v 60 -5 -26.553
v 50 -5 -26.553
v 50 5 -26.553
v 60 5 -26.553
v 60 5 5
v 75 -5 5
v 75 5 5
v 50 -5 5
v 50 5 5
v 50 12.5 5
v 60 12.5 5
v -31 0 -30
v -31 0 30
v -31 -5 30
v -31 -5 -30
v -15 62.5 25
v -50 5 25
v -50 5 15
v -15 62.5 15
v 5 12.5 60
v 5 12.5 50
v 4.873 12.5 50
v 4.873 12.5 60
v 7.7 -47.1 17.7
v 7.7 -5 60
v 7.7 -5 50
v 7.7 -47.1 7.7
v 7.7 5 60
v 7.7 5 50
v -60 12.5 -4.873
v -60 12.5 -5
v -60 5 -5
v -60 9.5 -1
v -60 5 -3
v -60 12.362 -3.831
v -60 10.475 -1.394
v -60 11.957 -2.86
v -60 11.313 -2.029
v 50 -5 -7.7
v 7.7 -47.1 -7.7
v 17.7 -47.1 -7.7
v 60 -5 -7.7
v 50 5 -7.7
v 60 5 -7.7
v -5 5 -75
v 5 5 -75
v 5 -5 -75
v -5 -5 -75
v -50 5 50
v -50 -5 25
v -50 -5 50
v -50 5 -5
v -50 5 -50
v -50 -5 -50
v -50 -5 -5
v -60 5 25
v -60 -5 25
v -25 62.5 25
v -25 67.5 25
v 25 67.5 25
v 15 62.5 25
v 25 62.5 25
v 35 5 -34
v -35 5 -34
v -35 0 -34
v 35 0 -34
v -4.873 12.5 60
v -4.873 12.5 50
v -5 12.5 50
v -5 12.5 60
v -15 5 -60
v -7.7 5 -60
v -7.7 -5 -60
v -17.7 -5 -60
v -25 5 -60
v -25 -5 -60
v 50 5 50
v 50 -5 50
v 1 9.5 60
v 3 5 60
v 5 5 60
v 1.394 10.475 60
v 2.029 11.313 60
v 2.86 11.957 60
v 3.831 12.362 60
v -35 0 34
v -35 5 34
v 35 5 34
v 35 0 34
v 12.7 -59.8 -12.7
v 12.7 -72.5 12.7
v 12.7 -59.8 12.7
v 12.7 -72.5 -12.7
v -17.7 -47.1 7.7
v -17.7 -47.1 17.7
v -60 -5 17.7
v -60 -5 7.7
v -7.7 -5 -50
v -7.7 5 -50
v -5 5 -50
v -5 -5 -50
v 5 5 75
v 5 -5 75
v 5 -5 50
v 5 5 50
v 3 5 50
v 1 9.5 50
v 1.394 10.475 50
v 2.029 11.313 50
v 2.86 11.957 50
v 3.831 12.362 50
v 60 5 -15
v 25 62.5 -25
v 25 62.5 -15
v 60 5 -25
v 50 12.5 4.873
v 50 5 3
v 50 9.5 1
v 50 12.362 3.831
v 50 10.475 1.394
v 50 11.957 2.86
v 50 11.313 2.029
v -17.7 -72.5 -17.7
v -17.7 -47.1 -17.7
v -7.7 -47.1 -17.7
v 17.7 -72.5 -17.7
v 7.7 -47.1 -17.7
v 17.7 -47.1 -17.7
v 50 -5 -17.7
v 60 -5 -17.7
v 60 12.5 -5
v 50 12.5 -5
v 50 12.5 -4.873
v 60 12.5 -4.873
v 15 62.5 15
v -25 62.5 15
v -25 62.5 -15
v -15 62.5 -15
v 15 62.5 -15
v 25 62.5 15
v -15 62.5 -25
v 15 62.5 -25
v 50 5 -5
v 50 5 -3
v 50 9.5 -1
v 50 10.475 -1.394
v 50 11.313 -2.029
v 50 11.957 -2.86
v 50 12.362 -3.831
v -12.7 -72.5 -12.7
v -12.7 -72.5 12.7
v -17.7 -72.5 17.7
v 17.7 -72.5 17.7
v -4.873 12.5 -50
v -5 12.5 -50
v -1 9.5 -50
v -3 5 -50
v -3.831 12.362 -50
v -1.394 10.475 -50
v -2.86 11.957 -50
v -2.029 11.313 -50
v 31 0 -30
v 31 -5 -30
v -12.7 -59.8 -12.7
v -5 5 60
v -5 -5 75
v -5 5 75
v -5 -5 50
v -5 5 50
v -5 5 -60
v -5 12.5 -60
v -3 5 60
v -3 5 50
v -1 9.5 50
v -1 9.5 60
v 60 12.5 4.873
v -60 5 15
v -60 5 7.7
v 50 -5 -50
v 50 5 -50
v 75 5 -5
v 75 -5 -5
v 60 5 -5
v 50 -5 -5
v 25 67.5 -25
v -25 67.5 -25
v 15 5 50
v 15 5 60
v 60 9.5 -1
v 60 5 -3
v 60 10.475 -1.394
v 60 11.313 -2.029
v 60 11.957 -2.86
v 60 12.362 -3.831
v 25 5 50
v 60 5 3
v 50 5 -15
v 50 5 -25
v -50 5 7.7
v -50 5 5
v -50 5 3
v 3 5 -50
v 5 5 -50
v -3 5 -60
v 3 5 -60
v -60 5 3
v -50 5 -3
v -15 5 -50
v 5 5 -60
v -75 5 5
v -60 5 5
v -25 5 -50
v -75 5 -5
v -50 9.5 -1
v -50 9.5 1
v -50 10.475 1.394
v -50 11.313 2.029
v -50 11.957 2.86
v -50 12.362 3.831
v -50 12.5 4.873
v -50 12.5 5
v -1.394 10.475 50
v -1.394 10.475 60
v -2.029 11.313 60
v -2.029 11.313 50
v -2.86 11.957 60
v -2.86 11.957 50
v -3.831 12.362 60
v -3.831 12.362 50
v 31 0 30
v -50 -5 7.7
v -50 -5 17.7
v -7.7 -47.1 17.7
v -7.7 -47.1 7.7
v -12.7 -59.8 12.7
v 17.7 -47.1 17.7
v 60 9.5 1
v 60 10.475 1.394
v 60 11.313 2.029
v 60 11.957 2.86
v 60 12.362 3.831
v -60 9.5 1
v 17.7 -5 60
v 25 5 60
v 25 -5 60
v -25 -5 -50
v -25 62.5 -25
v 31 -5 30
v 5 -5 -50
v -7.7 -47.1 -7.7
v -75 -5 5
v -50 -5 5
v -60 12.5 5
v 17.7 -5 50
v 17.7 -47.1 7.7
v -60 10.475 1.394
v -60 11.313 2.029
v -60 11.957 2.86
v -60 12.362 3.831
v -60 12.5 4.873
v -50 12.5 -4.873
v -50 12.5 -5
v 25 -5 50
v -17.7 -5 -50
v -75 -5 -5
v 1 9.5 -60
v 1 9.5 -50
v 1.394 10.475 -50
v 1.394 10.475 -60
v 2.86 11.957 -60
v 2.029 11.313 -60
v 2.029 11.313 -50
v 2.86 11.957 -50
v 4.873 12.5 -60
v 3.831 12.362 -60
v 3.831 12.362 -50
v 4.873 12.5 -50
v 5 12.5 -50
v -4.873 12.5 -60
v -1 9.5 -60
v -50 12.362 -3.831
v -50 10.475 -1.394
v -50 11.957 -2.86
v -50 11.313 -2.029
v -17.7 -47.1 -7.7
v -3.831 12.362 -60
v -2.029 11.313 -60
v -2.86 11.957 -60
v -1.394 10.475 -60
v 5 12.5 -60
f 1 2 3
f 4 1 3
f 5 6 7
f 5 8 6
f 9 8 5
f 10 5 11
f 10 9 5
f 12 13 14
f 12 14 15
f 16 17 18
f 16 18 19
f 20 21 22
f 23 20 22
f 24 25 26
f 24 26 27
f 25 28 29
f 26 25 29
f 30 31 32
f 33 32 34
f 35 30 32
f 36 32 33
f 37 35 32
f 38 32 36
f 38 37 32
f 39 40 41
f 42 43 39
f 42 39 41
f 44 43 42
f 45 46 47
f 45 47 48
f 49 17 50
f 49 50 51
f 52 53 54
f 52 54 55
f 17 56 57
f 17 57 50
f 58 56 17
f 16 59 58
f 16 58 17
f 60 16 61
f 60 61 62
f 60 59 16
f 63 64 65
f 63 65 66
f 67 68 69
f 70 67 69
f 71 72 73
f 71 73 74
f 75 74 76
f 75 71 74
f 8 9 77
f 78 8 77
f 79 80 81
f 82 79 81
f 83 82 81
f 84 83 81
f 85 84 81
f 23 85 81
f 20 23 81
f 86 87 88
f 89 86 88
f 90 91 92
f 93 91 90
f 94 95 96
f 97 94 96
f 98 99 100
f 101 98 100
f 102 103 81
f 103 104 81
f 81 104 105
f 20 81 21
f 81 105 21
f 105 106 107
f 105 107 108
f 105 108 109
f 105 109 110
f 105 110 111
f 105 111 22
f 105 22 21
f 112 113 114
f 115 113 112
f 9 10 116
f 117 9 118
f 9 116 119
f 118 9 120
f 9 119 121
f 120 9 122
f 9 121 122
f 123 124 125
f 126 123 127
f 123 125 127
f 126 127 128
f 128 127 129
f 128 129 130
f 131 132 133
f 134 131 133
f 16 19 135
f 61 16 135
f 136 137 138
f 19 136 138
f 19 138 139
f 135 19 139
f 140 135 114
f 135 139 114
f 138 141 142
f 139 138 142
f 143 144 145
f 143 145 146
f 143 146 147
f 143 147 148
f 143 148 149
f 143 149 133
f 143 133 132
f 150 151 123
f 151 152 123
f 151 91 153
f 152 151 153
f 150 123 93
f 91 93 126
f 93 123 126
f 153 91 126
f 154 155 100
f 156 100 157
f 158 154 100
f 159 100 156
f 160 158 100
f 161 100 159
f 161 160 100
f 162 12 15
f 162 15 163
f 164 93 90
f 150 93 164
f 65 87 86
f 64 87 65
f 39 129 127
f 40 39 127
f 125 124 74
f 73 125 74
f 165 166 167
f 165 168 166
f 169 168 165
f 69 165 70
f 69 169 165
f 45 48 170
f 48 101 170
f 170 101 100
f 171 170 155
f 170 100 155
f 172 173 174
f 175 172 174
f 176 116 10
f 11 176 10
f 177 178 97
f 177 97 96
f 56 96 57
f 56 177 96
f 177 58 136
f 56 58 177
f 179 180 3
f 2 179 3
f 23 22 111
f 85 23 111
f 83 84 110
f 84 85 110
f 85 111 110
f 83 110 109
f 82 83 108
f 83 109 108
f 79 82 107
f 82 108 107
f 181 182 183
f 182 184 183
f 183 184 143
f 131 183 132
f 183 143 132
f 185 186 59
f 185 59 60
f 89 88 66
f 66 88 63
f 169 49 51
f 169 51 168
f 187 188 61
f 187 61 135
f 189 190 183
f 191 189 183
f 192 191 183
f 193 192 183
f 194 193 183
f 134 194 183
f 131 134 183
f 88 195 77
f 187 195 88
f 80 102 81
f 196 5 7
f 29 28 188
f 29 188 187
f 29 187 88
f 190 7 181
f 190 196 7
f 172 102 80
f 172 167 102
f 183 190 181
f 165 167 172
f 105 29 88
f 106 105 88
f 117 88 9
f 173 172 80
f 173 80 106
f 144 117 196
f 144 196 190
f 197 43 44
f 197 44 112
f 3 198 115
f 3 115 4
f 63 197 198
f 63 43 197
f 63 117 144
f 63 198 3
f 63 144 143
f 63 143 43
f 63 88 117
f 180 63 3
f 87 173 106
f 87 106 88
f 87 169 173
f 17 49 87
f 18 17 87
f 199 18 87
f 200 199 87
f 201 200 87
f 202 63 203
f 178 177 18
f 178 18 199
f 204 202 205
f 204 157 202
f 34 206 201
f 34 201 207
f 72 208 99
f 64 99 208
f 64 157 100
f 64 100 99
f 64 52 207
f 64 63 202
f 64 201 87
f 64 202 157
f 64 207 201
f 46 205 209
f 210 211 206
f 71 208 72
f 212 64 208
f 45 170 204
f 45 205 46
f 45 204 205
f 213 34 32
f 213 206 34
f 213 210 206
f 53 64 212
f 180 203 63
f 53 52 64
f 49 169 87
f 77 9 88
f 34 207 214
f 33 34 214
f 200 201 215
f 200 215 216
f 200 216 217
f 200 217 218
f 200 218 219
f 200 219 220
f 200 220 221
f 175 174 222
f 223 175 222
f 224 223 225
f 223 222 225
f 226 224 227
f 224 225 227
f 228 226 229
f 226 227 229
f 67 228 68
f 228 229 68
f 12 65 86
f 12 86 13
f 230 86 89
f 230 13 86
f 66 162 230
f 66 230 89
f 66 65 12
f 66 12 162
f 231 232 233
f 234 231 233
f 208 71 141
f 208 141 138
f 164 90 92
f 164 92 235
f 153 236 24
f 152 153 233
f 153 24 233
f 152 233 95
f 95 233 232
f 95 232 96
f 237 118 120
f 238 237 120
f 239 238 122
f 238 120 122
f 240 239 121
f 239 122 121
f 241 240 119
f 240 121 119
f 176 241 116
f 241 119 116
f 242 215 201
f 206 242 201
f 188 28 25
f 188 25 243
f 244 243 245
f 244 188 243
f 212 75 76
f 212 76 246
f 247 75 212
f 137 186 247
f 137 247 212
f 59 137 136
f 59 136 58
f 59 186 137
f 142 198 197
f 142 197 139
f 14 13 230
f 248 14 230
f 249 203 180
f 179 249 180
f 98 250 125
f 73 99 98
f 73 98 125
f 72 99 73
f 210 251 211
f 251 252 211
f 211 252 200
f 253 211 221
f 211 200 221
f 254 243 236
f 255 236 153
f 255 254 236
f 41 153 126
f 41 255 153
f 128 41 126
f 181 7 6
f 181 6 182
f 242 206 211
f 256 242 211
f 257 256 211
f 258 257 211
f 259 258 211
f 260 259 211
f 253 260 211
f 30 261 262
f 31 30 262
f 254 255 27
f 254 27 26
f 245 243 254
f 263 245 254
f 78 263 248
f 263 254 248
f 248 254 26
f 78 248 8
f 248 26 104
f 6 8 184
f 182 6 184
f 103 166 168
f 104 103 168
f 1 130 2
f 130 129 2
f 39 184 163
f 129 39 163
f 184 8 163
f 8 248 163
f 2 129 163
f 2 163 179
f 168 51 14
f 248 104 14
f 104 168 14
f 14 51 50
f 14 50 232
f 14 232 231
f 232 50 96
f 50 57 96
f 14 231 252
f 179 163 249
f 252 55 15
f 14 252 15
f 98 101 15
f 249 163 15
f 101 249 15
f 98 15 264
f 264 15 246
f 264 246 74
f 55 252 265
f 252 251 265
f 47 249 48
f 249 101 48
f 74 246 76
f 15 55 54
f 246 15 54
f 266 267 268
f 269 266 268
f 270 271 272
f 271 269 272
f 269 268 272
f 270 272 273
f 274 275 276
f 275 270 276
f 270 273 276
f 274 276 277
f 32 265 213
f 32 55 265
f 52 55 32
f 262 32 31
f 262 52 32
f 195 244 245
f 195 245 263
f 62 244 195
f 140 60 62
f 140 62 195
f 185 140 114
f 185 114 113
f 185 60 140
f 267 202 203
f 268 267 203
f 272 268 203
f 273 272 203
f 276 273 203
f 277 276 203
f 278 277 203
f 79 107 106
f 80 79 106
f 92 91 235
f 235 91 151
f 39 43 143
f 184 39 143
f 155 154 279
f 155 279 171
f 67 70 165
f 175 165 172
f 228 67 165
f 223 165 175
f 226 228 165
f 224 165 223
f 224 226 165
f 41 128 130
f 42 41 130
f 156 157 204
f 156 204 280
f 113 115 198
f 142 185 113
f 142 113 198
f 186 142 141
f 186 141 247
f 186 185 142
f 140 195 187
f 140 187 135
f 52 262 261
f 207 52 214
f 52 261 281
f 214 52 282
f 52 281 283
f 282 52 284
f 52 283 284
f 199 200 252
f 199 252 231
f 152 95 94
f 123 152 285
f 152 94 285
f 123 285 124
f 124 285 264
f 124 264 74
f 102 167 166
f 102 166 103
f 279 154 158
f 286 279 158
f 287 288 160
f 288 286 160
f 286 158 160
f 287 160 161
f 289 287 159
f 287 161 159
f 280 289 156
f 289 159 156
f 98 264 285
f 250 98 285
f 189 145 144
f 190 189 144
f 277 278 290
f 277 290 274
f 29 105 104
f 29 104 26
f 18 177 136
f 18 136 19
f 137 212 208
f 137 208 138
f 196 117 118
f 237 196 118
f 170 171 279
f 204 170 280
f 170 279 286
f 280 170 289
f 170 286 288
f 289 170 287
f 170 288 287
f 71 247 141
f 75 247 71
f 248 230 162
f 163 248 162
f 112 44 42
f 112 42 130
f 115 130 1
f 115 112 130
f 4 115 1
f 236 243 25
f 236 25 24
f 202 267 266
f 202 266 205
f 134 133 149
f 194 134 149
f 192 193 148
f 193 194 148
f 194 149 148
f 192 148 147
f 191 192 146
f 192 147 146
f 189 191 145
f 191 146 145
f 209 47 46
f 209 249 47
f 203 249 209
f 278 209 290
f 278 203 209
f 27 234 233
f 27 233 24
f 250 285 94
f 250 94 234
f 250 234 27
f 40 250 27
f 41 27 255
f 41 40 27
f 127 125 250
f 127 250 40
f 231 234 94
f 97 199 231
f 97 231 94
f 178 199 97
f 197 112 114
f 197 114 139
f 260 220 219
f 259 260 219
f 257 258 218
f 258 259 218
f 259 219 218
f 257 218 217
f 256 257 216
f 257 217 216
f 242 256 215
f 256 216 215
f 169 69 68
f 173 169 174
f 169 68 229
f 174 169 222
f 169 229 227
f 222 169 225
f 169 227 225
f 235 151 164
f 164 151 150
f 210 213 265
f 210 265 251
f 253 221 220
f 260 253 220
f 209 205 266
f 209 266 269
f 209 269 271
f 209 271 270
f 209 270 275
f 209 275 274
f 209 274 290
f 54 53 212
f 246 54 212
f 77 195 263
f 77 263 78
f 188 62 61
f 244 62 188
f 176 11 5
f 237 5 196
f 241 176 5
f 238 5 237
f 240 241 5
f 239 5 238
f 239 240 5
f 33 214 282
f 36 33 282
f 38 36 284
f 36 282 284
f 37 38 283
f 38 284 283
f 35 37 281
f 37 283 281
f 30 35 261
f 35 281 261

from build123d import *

# Parameters (mm, degrees)
SKETCH2_W            = 100
SKETCH2_H            = 100
BOSS_EXTRUDE1_DEPTH  = 5
SKETCH3_W            = 100
SKETCH3_H            = 100
BOSS_EXTRUDE2_DEPTH  = 5
SKETCH8_R            = 5
BOSS_EXTRUDE7_DEPTH  = 30
BOSS_EXTRUDE21_DEPTH = 10
FILLET14_R           = 4
FILLET13_R           = 4
SKETCH24_W           = 10
SKETCH24_H           = 10
BOSS_EXTRUDE22_DEPTH = 15
BOSS_EXTRUDE25_DEPTH = 10
SKETCH26_W           = 10
SKETCH26_H           = 10
BOSS_EXTRUDE26_DEPTH = 15
FILLET18_R           = 4
FILLET17_R           = 4
BOSS_EXTRUDE23_DEPTH = 10
SKETCH25_W           = 10
SKETCH25_H           = 10
BOSS_EXTRUDE24_DEPTH = 15
FILLET15_R           = 4
FILLET16_R           = 4
BOSS_EXTRUDE10_DEPTH = 10
FILLET19_R           = 4
SKETCH27_W           = 10
SKETCH27_H           = 10
BOSS_EXTRUDE27_DEPTH = 15
FILLET20_R           = 4
SKETCH62_R           = 11.223510807
CUT_EXTRUDE3_DEPTH   = 30
SKETCH64_W           = 35.4
SKETCH64_H           = 35.4
BOSS_EXTRUDE53_DEPTH = 25.4
SKETCH66_W           = 25.4
SKETCH66_H           = 25.4
CUT_EXTRUDE4_DEPTH   = 12.7
SKETCH67_W           = 50
SKETCH67_H           = 50
BOSS_EXTRUDE54_DEPTH = 5
SKETCH68_W           = 17.3
SKETCH68_H           = 10
BOSS_EXTRUDE55_DEPTH = 10
SKETCH69_W           = 17.3
SKETCH69_H           = 10
BOSS_EXTRUDE56_DEPTH = 10
SKETCH70_W           = 17.3
SKETCH70_H           = 10
BOSS_EXTRUDE57_DEPTH = 10
SKETCH74_W           = 17.3
SKETCH74_H           = 10
BOSS_EXTRUDE58_DEPTH = 10
BOSS_EXTRUDE59_DEPTH = 10
BOSS_EXTRUDE60_DEPTH = 10
BOSS_EXTRUDE61_DEPTH = 10
BOSS_EXTRUDE62_DEPTH = 10
BOSS_EXTRUDE63_DEPTH = 10
BOSS_EXTRUDE64_DEPTH = 10
SKETCH85_W           = 17.3
SKETCH85_H           = 10
BOSS_EXTRUDE65_DEPTH = 10
BOSS_EXTRUDE66_DEPTH = 10
BOSS_EXTRUDE67_DEPTH = 10
SKETCH90_W           = 70
SKETCH90_H           = 68
CUT_EXTRUDE5_DEPTH   = 5
SKETCH91_W           = 62
SKETCH91_H           = 60
CUT_EXTRUDE6_DEPTH   = 5


with BuildPart() as part:
    # Sketch2 → Boss-Extrude1 (new body)
    with BuildSketch(Plane(origin=(0, 0, 0), x_dir=(1, 0, 0), z_dir=(0, 1, 0))):
        Rectangle(SKETCH2_W, SKETCH2_H)
    extrude(amount=BOSS_EXTRUDE1_DEPTH)

    # Sketch3 → Boss-Extrude2 (add)
    with BuildSketch(Plane.XZ):
        Rectangle(SKETCH3_W, SKETCH3_H)
    extrude(amount=BOSS_EXTRUDE2_DEPTH)

    # Sketch8 → Boss-Extrude7 (add)
    with BuildSketch(Plane.XZ.offset(5)):
        with Locations(Location((0, 0, 0), (0, 0, 90))):
            Circle(SKETCH8_R)
    extrude(amount=BOSS_EXTRUDE7_DEPTH)

    # Sketch11 → Boss-Extrude21 (add)
    with BuildSketch(Plane(origin=(50, 0, 0), x_dir=(0, 0, -1), z_dir=(1, 0, 0))):
        Polygon((5, -5), (5, 12.5), (1, 12.5), (1, 9.5), (3, 5), (-3, 5), (-1, 9.5), (-1, 12.5), (-5, 12.5), (-5, -5), align=None)
    extrude(amount=BOSS_EXTRUDE21_DEPTH)

    # Fillet14
    # the kernel refuses this fillet: 4 mm, written as the material it takes off along each edge
    with BuildSketch(Plane(origin=(40.317541634, 12.5, -1), x_dir=(0, -1, 0), z_dir=(1, 0, 0))) as fillet14_piece_1:
        with BuildLine():
            CenterArc((4, 3.872983346), FILLET14_R, 180, 75.522487814)
            Line((0, 3.872983346), (-0.08, 3.872983346))
            Line((-0.08, 3.872983346), (-0.08, 0))
            Line((-0.08, 0), (0, -0.08))
            ThreePointArc((0, -0.08), (1.5, -0.08), (2.98, -0.077459667))
            Line((2.98, -0.077459667), (3, 0))
        make_face()
    extrude(amount=29.364916731, mode=Mode.SUBTRACT)

    # Fillet13
    # the kernel refuses this fillet: 4 mm, written as the material it takes off along each edge
    with BuildSketch(Plane(origin=(40.317541634, 12.5, 1), x_dir=(0, 0, 1), z_dir=(1, 0, 0))) as fillet13_piece_1:
        with BuildLine():
            CenterArc((3.872983346, 4), FILLET13_R, 194.477512186, 75.522487814)
            Line((0, 3), (-0.077459667, 2.98))
            ThreePointArc((-0.077459667, 2.98), (-0.08, 1.5), (-0.08, 0))
            Line((-0.08, 0), (0, -0.08))
            Line((0, -0.08), (3.872983346, -0.08))
            Line((3.872983346, -0.08), (3.872983346, 0))
        make_face()
    extrude(amount=29.364916731, mode=Mode.SUBTRACT)

    # Sketch24 → Boss-Extrude22 (add)
    with BuildSketch(Plane(origin=(60, 0, 0), x_dir=(0, 0, -1), z_dir=(1, 0, 0))):
        Rectangle(SKETCH24_W, SKETCH24_H)
    extrude(amount=BOSS_EXTRUDE22_DEPTH)

    # Sketch13 → Boss-Extrude25 (add)
    with BuildSketch(Plane.ZY.offset(50)):
        Polygon((-5, 12.5), (-5, -5), (5, -5), (5, 12.5), (1, 12.5), (1, 9.5), (3, 5), (-3, 5), (-1, 9.5), (-1, 12.5), align=None)
    extrude(amount=BOSS_EXTRUDE25_DEPTH)

    # Sketch26 → Boss-Extrude26 (add)
    with BuildSketch(Plane.ZY.offset(60)):
        Rectangle(SKETCH26_W, SKETCH26_H)
    extrude(amount=BOSS_EXTRUDE26_DEPTH)

    # Fillet18
    # the kernel refuses this fillet: 4 mm, written as the material it takes off along each edge
    with BuildSketch(Plane(origin=(-40.317541634, 12.5, 1), x_dir=(0, -1, 0), z_dir=(-1, 0, 0))) as fillet18_piece_1:
        with BuildLine():
            CenterArc((4, 3.872983346), FILLET18_R, 180, 75.522487814)
            Line((0, 3.872983346), (-0.08, 3.872983346))
            Line((-0.08, 3.872983346), (-0.08, 0))
            Line((-0.08, 0), (0, -0.08))
            ThreePointArc((0, -0.08), (1.5, -0.08), (2.98, -0.077459667))
            Line((2.98, -0.077459667), (3, 0))
        make_face()
    extrude(amount=29.364916731, mode=Mode.SUBTRACT)

    # Fillet17
    # the kernel refuses this fillet: 4 mm, written as the material it takes off along each edge
    with BuildSketch(Plane(origin=(-40.317541634, 12.5, -1), x_dir=(0, 0, -1), z_dir=(-1, 0, 0))) as fillet17_piece_1:
        with BuildLine():
            CenterArc((3.872983346, 4), FILLET17_R, 194.477512186, 75.522487814)
            Line((0, 3), (-0.077459667, 2.98))
            ThreePointArc((-0.077459667, 2.98), (-0.08, 1.5), (-0.08, 0))
            Line((-0.08, 0), (0, -0.08))
            Line((0, -0.08), (3.872983346, -0.08))
            Line((3.872983346, -0.08), (3.872983346, 0))
        make_face()
    extrude(amount=29.364916731, mode=Mode.SUBTRACT)

    # Sketch14 → Boss-Extrude23 (add)
    with BuildSketch(Plane(origin=(0, 0, -50), x_dir=(-1, 0, 0), z_dir=(0, 0, -1))):
        Polygon((-5, 12.5), (-1, 12.5), (-1, 9.5), (-3, 5), (3, 5), (1, 9.5), (1, 12.5), (5, 12.5), (5, -5), (-5, -5), align=None)
    extrude(amount=BOSS_EXTRUDE23_DEPTH)

    # Sketch25 → Boss-Extrude24 (add)
    with BuildSketch(Plane(origin=(0, 0, -60), x_dir=(-1, 0, 0), z_dir=(0, 0, -1))):
        Rectangle(SKETCH25_W, SKETCH25_H)
    extrude(amount=BOSS_EXTRUDE24_DEPTH)

    # Fillet15
    # the kernel refuses this fillet: 4 mm, written as the material it takes off along each edge
    with BuildSketch(Plane(origin=(-1, 12.5, -40.317541634), x_dir=(0, -1, 0), z_dir=(0, 0, -1))) as fillet15_piece_1:
        with BuildLine():
            CenterArc((4, 3.872983346), FILLET15_R, 180, 75.522487814)
            Line((0, 3.872983346), (-0.08, 3.872983346))
            Line((-0.08, 3.872983346), (-0.08, 0))
            Line((-0.08, 0), (0, -0.08))
            ThreePointArc((0, -0.08), (1.5, -0.08), (2.98, -0.077459667))
            Line((2.98, -0.077459667), (3, 0))
        make_face()
    extrude(amount=29.364916731, mode=Mode.SUBTRACT)

    # Fillet16
    # the kernel refuses this fillet: 4 mm, written as the material it takes off along each edge
    with BuildSketch(Plane(origin=(1, 12.5, -40.317541634), x_dir=(0, -1, 0), z_dir=(0, 0, -1))) as fillet16_piece_1:
        with BuildLine():
            CenterArc((4, -3.872983346), FILLET16_R, 104.477512186, 75.522487814)
            Line((0, -3.872983346), (-0.08, -3.872983346))
            Line((-0.08, -3.872983346), (-0.08, 0))
            Line((-0.08, 0), (0, 0.08))
            ThreePointArc((0, 0.08), (1.5, 0.08), (2.98, 0.077459667))
            Line((2.98, 0.077459667), (3, 0))
        make_face()
    extrude(amount=29.364916731, mode=Mode.SUBTRACT)

    # Sketch12 → Boss-Extrude10 (add)
    with BuildSketch(Plane.XY.offset(50)):
        Polygon((-5, 12.5), (-5, -5), (5, -5), (5, 12.5), (1, 12.5), (1, 9.5), (3, 5), (-3, 5), (-1, 9.5), (-1, 12.5), align=None)
    extrude(amount=BOSS_EXTRUDE10_DEPTH)

    # Fillet19
    # the kernel refuses this fillet: 4 mm, written as the material it takes off along each edge
    with BuildSketch(Plane(origin=(-1, 12.5, 40.317541634), x_dir=(-1, 0, 0), z_dir=(0, 0, 1))) as fillet19_piece_1:
        with BuildLine():
            CenterArc((3.872983346, 4), FILLET19_R, 194.477512186, 75.522487814)
            Line((0, 3), (-0.077459667, 2.98))
            ThreePointArc((-0.077459667, 2.98), (-0.08, 1.5), (-0.08, 0))
            Line((-0.08, 0), (0, -0.08))
            Line((0, -0.08), (3.872983346, -0.08))
            Line((3.872983346, -0.08), (3.872983346, 0))
        make_face()
    extrude(amount=29.364916731, mode=Mode.SUBTRACT)

    # Sketch27 → Boss-Extrude27 (add)
    with BuildSketch(Plane.XY.offset(60)):
        Rectangle(SKETCH27_W, SKETCH27_H)
    extrude(amount=BOSS_EXTRUDE27_DEPTH)

    # Fillet20
    # the kernel refuses this fillet: 4 mm, written as the material it takes off along each edge
    with BuildSketch(Plane(origin=(1, 12.5, 40.317541634), x_dir=(1, 0, 0), z_dir=(0, 0, 1))) as fillet20_piece_1:
        with BuildLine():
            CenterArc((3.872983346, -4), FILLET20_R, 90, 75.522487814)
            Line((0, -3), (-0.077459667, -2.98))
            ThreePointArc((-0.077459667, -2.98), (-0.08, -1.5), (-0.08, 0))
            Line((-0.08, 0), (0, 0.08))
            Line((0, 0.08), (3.872983346, 0.08))
            Line((3.872983346, 0.08), (3.872983346, 0))
        make_face()
    extrude(amount=29.364916731, mode=Mode.SUBTRACT)

    # Sketch62 → Cut-Extrude3 (cut)
    with BuildSketch(Plane.XZ.offset(5)):
        Circle(SKETCH62_R)
    extrude(amount=CUT_EXTRUDE3_DEPTH, mode=Mode.SUBTRACT)

    # Sketch68 → Boss-Extrude55 (add)
    with BuildSketch(Plane.XY.offset(50)):
        with Locations((16.35, 0)):
            Rectangle(SKETCH68_W, SKETCH68_H)
    extrude(amount=BOSS_EXTRUDE55_DEPTH)

    # Sketch69 → Boss-Extrude56 (add)
    with BuildSketch(Plane(origin=(50, 0, 0), x_dir=(0, 0, -1), z_dir=(1, 0, 0))):
        with Locations((17.90253263, 0)):
            Rectangle(SKETCH69_W, SKETCH69_H)
    extrude(amount=BOSS_EXTRUDE56_DEPTH)

    # Sketch70 → Boss-Extrude57 (add)
    with BuildSketch(Plane(origin=(0, 0, -50), x_dir=(-1, 0, 0), z_dir=(0, 0, -1))):
        with Locations((16.35, 0)):
            Rectangle(SKETCH70_W, SKETCH70_H)
    extrude(amount=BOSS_EXTRUDE57_DEPTH)

    # Sketch74 → Boss-Extrude58 (add)
    with BuildSketch(Plane.ZY.offset(50)):
        with Locations((16.35, 0)):
            Rectangle(SKETCH74_W, SKETCH74_H)
    extrude(amount=BOSS_EXTRUDE58_DEPTH)



with BuildPart() as body_2:
    # Sketch64 → Boss-Extrude53 (new body)
    with BuildSketch(Plane(origin=(0, -72.5, 0), x_dir=(1, 0, 0), z_dir=(0, 1, 0))):
        Rectangle(SKETCH64_W, SKETCH64_H)
    extrude(amount=BOSS_EXTRUDE53_DEPTH)

    # Sketch66 → Cut-Extrude4 (cut)
    with BuildSketch(Plane(origin=(0, -72.5, 0), x_dir=(-1, 0, 0), z_dir=(0, -1, 0))):
        Rectangle(SKETCH66_W, SKETCH66_H)
    extrude(amount=-CUT_EXTRUDE4_DEPTH, mode=Mode.SUBTRACT)


with BuildPart() as body_3:
    # Sketch67 → Boss-Extrude54 (new body)
    with BuildSketch(Plane(origin=(0, 67.5, 0), x_dir=(1, 0, 0), z_dir=(0, 1, 0))):
        Rectangle(SKETCH67_W, SKETCH67_H)
    extrude(amount=-BOSS_EXTRUDE54_DEPTH)


with BuildPart() as part_1:
    add(part.part)

    add(body_2.part)  # Boss-Extrude59 merges body 2
    # Sketch76 → Boss-Extrude59 (add)
    with BuildSketch(Plane.ZY.offset(17.7)):
        Polygon((-17.7, -47.1), (-60, -5), (-50, -5), (-7.7, -47.1), align=None)
    extrude(amount=-BOSS_EXTRUDE59_DEPTH)


    add(body_3.part)  # Boss-Extrude60 merges body 3
    # Sketch77 → Boss-Extrude60 (add)
    with BuildSketch(Plane.ZY.offset(25)):
        Polygon((-25, 62.5), (-60, 5), (-50, 5), (-15, 62.5), align=None)
    extrude(amount=-BOSS_EXTRUDE60_DEPTH)

    # Sketch78 → Boss-Extrude61 (add)
    with BuildSketch(Plane.XY.offset(17.7)):
        Polygon((-17.7, -47.1), (-60, -5), (-50, -5), (-7.7, -47.1), align=None)
    extrude(amount=-BOSS_EXTRUDE61_DEPTH)

    # Sketch79 → Boss-Extrude62 (add)
    with BuildSketch(Plane.XY.offset(25)):
        Polygon((-25, 62.5), (-60, 5), (-50, 5), (-15, 62.5), align=None)
    extrude(amount=-BOSS_EXTRUDE62_DEPTH)

    # Sketch82 → Boss-Extrude63 (add)
    with BuildSketch(Plane(origin=(17.7, 0, 0), x_dir=(0, 0, -1), z_dir=(1, 0, 0))):
        Polygon((-60, -5), (-17.7, -47.1), (-7.7, -47.1), (-50, -5), align=None)
    extrude(amount=-BOSS_EXTRUDE63_DEPTH)

    # Sketch83 → Boss-Extrude64 (add)
    with BuildSketch(Plane(origin=(25, 0, 0), x_dir=(0, 0, -1), z_dir=(1, 0, 0))):
        Polygon((-25, 62.5), (-60, 5), (-50, 5), (-15, 62.5), align=None)
    extrude(amount=-BOSS_EXTRUDE64_DEPTH)

    # Sketch85 → Boss-Extrude65 (add)
    with BuildSketch(Plane(origin=(50, 0, 0), x_dir=(0, 0, -1), z_dir=(1, 0, 0))):
        with Locations((16.35, 0)):
            Rectangle(SKETCH85_W, SKETCH85_H)
    extrude(amount=BOSS_EXTRUDE65_DEPTH)

    # Sketch86 → Boss-Extrude66 (add)
    with BuildSketch(Plane(origin=(0, 0, -25), x_dir=(-1, 0, 0), z_dir=(0, 0, -1))):
        Polygon((-25, 62.5), (-60, 5), (-50, 5), (-15, 62.5), align=None)
    extrude(amount=-BOSS_EXTRUDE66_DEPTH)

    # Sketch89 → Boss-Extrude67 (add)
    with BuildSketch(Plane(origin=(0, 0, -17.7), x_dir=(-1, 0, 0), z_dir=(0, 0, -1))):
        Polygon((-60, -5), (-50, -5), (-7.7, -47.1), (-17.7, -47.1), align=None)
    extrude(amount=-BOSS_EXTRUDE67_DEPTH)

    # Sketch90 → Cut-Extrude5 (cut)
    with BuildSketch(Plane(origin=(0, 5, 0), x_dir=(1, 0, 0), z_dir=(0, 1, 0))):
        Rectangle(SKETCH90_W, SKETCH90_H)
    extrude(amount=-CUT_EXTRUDE5_DEPTH, mode=Mode.SUBTRACT)

    # Sketch91 → Cut-Extrude6 (cut)
    with BuildSketch(Plane(origin=(0, 0, 0), x_dir=(1, 0, 0), z_dir=(0, 1, 0))):
        Rectangle(SKETCH91_W, SKETCH91_H)
    extrude(amount=-CUT_EXTRUDE6_DEPTH, mode=Mode.SUBTRACT)


solid = part_1.part
